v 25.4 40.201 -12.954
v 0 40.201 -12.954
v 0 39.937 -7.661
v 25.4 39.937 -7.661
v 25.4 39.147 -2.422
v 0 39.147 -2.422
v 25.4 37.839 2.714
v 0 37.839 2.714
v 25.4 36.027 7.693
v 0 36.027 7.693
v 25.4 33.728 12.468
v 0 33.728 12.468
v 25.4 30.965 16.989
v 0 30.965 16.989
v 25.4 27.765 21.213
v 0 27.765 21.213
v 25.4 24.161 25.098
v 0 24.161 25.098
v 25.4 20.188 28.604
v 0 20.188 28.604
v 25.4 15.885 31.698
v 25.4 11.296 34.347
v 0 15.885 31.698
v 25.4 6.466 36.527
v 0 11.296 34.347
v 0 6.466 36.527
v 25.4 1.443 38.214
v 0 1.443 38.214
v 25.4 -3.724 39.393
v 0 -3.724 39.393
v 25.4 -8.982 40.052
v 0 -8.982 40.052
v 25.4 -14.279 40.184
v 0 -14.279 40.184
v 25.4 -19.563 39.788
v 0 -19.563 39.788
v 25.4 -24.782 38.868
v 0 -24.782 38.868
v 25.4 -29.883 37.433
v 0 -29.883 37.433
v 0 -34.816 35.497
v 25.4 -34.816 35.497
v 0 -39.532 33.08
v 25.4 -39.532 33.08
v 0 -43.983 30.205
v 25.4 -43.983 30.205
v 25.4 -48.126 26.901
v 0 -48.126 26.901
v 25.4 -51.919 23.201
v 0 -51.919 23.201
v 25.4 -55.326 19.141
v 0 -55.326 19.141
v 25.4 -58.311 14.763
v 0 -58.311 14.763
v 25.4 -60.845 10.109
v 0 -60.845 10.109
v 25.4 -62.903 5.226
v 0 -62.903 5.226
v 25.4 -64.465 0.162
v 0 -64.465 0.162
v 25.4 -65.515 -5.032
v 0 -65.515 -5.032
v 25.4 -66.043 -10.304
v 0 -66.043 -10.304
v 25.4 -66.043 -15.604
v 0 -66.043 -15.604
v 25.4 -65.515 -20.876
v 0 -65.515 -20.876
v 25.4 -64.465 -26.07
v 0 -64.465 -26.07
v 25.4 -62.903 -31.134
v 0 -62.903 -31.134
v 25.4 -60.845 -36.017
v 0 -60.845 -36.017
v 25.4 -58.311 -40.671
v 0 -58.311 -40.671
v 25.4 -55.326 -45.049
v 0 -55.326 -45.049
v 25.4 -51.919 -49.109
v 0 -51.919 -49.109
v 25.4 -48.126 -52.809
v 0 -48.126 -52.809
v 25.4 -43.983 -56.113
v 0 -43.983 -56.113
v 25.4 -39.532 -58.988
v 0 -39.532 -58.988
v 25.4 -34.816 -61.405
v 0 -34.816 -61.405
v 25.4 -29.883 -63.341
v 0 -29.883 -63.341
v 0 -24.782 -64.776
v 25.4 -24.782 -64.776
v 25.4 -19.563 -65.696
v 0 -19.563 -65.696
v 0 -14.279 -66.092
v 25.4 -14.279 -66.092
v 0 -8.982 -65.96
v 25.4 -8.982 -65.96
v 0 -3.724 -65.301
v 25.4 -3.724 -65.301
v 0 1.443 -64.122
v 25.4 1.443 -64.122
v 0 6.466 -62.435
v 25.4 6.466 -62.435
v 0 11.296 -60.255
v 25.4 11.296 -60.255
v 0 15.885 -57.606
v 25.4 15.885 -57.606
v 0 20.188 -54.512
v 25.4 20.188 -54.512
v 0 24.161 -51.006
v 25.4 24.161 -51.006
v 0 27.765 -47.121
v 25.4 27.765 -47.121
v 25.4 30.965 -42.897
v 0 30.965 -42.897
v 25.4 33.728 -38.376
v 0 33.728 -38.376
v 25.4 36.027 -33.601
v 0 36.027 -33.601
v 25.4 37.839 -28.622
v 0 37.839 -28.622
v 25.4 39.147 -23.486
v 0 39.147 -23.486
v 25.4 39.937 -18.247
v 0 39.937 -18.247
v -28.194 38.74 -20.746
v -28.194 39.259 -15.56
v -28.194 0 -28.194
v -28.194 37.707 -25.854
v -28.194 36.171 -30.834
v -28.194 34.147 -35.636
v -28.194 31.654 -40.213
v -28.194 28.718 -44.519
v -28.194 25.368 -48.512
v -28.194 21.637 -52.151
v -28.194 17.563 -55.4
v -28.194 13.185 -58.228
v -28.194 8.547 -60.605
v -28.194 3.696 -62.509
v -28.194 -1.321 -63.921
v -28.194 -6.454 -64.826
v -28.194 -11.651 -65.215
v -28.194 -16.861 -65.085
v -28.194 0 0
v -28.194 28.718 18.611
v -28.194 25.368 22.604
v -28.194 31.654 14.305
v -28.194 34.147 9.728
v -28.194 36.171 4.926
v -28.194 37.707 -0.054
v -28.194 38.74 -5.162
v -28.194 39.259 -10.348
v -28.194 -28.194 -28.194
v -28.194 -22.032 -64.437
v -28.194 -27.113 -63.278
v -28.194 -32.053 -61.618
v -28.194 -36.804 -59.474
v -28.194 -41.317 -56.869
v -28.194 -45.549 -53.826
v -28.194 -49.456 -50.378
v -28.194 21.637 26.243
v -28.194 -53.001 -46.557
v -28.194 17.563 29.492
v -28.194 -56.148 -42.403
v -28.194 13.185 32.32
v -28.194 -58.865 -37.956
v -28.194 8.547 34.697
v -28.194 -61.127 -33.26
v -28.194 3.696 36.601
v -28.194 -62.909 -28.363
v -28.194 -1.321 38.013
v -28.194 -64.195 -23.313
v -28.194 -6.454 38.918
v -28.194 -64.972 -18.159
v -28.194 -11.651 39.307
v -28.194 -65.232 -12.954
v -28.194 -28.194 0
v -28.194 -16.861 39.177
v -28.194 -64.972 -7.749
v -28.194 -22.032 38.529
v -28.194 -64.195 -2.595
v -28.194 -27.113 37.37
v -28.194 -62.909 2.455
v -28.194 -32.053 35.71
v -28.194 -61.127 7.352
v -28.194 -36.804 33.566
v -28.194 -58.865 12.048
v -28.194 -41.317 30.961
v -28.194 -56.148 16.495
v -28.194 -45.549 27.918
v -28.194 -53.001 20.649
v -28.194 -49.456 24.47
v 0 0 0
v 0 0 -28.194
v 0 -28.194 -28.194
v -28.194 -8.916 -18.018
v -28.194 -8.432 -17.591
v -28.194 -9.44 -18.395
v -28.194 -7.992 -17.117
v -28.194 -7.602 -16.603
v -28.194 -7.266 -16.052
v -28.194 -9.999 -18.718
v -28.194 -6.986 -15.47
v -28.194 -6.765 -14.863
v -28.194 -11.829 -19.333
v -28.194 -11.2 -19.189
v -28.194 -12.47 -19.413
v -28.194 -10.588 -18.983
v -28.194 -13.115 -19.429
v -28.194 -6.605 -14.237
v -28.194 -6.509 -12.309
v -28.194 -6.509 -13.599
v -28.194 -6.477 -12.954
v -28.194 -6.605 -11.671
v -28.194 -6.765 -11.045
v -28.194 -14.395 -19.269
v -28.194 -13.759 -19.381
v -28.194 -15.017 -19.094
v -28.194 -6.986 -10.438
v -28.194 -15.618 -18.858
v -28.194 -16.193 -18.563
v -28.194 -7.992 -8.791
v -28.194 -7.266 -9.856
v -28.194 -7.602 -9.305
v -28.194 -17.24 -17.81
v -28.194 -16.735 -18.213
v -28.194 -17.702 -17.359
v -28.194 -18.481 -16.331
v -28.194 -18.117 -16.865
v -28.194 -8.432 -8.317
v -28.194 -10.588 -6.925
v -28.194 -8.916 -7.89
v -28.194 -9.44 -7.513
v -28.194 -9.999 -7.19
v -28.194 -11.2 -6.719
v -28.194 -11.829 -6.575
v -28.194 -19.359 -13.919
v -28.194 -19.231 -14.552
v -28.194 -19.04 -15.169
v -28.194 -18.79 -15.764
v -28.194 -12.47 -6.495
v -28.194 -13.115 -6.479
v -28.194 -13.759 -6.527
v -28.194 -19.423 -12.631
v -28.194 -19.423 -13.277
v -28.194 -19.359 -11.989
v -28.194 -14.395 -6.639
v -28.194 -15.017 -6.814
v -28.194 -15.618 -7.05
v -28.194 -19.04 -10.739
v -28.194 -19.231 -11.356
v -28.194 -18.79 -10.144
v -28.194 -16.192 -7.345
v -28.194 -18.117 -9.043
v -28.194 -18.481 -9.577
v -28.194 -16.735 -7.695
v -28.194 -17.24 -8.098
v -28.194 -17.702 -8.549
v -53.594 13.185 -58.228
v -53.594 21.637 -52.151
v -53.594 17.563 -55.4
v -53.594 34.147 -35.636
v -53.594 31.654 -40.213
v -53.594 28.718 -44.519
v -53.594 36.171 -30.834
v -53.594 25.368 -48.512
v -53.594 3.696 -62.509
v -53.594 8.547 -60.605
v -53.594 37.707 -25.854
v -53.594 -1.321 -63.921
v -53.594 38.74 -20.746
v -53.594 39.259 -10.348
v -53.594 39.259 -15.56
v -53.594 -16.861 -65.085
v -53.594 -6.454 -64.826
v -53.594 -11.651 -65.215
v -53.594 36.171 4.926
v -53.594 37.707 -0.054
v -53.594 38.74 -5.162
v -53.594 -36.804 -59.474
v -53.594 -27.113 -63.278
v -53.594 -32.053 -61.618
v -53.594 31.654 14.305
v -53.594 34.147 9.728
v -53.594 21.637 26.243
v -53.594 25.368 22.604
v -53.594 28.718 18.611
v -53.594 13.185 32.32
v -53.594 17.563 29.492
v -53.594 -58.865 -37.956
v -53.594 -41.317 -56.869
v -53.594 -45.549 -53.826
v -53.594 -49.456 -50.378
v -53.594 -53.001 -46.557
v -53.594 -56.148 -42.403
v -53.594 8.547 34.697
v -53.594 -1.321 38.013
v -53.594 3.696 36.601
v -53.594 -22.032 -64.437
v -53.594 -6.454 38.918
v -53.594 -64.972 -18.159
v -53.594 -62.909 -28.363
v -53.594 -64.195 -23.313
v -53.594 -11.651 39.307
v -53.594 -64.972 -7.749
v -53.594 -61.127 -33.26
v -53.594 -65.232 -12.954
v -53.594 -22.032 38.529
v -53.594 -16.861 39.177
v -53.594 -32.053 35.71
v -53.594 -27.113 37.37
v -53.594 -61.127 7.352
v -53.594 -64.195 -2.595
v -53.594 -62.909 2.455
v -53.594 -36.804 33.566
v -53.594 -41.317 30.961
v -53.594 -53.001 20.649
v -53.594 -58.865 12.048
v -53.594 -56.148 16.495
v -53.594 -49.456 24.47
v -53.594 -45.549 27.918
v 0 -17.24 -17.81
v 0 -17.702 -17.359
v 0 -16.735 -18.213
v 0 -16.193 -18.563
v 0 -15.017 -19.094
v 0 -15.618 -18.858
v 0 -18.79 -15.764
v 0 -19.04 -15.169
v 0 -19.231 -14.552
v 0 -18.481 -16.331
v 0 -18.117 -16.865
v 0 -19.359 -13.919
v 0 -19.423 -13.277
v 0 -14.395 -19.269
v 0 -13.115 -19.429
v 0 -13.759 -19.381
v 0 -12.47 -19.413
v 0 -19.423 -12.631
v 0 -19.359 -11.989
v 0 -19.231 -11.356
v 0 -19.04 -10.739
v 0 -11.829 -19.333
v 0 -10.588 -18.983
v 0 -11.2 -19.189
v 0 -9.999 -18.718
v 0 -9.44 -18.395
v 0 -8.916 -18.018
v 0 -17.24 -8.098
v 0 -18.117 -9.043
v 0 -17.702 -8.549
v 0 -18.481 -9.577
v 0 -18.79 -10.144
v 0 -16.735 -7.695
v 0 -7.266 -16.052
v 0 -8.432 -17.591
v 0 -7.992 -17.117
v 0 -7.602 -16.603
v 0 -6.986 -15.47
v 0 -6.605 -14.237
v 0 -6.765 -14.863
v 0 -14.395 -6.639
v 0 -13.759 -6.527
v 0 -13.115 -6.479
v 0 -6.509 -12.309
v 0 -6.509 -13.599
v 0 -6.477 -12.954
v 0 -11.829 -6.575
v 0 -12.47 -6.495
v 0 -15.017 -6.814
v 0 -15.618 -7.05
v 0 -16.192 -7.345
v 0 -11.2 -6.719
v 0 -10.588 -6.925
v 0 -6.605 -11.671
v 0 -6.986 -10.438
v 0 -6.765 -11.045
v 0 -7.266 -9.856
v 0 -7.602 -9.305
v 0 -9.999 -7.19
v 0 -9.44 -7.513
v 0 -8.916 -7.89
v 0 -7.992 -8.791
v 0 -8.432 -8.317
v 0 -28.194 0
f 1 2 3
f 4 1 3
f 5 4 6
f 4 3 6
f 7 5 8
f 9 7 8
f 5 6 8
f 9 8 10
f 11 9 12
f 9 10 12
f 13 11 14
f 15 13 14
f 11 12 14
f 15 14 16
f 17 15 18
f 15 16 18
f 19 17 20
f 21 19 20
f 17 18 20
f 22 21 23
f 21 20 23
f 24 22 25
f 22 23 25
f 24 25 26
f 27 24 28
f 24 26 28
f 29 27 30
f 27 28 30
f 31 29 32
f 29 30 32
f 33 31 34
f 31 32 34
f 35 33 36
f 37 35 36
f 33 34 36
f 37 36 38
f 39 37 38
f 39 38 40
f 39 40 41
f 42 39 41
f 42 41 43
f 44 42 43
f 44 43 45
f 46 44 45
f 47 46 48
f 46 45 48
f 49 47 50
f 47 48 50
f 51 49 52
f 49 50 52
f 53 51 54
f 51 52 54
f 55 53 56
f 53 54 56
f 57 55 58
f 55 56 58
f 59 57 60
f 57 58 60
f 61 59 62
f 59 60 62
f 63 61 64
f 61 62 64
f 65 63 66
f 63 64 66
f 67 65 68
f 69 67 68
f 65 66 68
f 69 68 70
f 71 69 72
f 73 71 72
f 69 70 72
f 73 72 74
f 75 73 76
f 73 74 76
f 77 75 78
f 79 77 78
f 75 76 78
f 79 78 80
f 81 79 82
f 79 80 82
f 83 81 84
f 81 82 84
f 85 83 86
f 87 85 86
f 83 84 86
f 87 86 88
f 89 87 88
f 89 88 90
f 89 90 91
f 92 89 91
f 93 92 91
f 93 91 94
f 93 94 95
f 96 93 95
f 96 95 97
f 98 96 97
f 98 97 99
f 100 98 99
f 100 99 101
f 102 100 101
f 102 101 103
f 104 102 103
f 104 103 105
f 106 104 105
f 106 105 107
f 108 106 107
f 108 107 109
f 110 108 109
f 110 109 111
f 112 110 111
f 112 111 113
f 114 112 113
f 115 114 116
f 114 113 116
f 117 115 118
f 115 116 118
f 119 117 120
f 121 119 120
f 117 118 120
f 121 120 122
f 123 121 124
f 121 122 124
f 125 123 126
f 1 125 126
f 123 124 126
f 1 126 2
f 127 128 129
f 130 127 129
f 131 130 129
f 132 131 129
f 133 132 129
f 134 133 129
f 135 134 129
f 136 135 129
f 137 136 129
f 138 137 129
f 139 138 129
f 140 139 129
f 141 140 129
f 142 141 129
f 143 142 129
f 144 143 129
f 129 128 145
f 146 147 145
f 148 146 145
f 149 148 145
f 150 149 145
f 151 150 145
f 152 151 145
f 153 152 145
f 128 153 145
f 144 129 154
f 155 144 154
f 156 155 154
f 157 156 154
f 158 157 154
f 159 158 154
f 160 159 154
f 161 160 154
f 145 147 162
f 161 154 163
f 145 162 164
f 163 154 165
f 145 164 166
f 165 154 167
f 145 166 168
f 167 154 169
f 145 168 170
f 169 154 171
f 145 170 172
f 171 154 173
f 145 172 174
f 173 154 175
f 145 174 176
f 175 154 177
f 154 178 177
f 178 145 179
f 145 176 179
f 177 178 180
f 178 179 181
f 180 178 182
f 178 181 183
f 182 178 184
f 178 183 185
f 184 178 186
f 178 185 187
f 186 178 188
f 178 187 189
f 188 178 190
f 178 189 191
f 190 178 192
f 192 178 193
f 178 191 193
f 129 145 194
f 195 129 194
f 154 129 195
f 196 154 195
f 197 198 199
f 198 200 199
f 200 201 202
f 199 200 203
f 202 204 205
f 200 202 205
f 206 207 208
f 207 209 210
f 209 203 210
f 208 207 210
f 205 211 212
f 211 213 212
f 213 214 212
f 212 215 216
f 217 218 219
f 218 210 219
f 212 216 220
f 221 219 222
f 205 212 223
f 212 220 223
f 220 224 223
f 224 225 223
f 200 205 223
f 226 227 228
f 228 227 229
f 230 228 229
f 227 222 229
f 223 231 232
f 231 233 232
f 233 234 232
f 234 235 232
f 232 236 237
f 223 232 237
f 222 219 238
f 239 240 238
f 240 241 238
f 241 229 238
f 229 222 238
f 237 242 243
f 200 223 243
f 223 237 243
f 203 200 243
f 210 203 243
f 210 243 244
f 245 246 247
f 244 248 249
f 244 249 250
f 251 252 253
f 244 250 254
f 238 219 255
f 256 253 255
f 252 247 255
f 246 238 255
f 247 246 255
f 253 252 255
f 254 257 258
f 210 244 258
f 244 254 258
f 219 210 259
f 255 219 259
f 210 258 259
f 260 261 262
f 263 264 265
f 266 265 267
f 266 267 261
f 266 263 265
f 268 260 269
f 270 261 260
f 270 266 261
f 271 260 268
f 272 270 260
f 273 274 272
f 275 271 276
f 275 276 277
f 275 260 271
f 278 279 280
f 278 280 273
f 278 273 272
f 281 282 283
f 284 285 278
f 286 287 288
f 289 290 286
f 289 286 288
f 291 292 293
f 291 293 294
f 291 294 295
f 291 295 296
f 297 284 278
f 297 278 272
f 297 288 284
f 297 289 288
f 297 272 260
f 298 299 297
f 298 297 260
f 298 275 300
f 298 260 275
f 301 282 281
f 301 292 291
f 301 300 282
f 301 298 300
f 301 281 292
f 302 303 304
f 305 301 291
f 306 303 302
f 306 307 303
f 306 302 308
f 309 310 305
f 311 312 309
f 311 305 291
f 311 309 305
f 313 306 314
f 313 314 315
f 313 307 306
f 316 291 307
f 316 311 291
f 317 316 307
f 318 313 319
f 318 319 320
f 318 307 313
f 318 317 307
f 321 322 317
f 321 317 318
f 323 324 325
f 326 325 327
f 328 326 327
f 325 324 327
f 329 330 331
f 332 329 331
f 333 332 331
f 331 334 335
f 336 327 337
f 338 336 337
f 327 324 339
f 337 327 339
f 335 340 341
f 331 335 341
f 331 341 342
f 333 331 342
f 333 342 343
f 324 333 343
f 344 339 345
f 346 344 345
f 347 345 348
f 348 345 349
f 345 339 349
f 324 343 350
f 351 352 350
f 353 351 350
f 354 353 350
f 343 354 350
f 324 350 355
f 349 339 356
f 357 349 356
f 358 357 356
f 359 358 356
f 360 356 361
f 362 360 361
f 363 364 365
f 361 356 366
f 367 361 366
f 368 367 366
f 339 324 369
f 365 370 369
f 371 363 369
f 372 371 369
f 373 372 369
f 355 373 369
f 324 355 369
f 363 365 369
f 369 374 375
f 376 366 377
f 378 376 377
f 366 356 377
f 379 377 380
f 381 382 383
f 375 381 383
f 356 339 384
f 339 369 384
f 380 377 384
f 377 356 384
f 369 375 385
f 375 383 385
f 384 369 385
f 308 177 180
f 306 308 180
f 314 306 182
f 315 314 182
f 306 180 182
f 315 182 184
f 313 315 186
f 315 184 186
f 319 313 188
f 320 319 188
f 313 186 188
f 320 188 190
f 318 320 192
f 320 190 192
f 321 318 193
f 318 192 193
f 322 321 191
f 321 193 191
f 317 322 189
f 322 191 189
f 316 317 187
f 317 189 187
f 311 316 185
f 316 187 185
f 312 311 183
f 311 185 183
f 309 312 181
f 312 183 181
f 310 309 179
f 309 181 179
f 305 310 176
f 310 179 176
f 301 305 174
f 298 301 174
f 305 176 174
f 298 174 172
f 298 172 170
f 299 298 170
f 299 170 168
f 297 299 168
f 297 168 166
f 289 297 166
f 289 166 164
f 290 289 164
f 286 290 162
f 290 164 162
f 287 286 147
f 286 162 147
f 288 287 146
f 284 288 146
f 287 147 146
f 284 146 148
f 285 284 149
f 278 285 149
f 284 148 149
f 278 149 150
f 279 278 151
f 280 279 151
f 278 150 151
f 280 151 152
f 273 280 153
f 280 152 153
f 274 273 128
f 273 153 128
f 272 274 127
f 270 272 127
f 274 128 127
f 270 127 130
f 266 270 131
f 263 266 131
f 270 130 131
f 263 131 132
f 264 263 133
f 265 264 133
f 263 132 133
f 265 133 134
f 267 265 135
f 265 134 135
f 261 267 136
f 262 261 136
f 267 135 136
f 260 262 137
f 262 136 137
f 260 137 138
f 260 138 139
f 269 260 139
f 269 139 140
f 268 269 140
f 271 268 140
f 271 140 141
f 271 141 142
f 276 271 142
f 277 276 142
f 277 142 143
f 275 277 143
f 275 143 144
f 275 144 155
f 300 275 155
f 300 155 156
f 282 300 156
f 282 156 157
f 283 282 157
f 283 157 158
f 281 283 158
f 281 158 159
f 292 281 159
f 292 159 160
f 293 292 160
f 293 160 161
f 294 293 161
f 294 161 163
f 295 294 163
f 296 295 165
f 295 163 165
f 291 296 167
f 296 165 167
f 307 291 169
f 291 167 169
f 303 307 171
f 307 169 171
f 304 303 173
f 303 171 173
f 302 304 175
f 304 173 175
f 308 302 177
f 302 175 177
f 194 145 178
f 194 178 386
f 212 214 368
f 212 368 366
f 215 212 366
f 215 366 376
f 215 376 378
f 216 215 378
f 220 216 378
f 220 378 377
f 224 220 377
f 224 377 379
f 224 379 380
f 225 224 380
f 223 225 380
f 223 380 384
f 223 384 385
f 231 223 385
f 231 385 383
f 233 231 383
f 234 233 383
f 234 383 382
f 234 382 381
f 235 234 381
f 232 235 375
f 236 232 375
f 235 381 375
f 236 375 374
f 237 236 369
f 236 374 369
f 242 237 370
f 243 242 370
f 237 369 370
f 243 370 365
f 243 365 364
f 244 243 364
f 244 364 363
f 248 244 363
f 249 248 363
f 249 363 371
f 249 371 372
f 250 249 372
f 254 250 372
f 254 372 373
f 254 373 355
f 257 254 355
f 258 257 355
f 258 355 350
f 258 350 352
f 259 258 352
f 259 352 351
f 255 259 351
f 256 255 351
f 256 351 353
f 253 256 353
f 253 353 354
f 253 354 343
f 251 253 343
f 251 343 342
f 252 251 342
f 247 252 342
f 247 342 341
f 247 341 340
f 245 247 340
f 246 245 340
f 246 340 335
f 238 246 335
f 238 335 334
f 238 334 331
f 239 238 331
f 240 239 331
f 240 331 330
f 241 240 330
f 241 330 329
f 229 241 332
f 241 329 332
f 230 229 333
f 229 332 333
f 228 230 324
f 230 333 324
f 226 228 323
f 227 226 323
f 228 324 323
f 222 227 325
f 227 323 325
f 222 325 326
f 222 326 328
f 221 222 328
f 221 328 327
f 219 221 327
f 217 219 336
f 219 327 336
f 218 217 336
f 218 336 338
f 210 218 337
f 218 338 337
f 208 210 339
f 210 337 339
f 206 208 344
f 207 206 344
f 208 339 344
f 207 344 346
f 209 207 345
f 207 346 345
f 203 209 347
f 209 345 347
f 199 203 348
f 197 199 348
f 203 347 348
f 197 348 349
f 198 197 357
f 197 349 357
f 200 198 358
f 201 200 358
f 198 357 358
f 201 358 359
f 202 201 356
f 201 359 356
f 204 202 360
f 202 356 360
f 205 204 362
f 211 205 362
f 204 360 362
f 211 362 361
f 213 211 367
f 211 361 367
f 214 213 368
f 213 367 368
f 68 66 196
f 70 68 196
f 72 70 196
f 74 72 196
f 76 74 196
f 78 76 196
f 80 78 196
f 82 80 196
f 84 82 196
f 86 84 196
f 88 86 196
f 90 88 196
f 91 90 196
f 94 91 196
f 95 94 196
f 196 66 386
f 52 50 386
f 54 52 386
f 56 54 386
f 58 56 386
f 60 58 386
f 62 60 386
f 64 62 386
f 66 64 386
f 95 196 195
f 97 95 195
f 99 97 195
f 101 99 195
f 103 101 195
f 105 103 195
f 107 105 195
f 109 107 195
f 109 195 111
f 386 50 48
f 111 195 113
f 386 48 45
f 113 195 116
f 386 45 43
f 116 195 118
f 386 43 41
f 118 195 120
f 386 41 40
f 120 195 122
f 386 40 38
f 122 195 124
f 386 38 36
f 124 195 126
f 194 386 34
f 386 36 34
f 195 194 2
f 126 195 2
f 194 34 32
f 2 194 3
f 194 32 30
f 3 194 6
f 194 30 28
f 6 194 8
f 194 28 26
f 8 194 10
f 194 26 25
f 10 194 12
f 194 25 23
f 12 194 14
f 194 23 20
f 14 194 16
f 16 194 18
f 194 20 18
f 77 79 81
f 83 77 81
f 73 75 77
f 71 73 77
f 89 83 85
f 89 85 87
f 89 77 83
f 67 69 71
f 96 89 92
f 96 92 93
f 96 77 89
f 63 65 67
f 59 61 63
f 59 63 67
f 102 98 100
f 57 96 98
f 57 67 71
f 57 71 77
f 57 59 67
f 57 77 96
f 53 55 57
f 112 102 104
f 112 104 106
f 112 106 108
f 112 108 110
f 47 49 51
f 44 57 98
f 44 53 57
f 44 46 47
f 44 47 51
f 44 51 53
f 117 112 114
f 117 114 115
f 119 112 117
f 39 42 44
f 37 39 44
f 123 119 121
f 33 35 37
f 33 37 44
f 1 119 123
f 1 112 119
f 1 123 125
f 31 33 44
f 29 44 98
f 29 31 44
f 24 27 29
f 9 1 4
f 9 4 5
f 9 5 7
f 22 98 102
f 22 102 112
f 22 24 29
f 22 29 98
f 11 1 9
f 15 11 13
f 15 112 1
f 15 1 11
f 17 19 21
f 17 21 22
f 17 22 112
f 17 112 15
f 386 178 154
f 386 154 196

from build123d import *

# Parameters (mm, degrees)
F0_W     = 28.194
F0_H     = 28.194
F1_DEPTH = 28.194
F2_R     = 6.477
F3_DEPTH = 28.195
F4_R     = 53.155015
F5_DEPTH = 25.4
F6_R     = 52.277652
F7_DEPTH = 25.4


with BuildPart() as f1:
    # F0 (on Front) → F1 (new body)
    with BuildSketch(Plane.XZ):
        with Locations((-14.097, -14.097)):
            Rectangle(F0_W, F0_H)
    extrude(amount=F1_DEPTH)

    # F2 (on face) → F3 (cut, through all)
    with BuildSketch(Plane.YZ):
        with Locations((-12.954, -12.954)):
            Circle(F2_R)
    extrude(amount=-F3_DEPTH, mode=Mode.SUBTRACT)

    # F4 (on face) → F5 (join)
    with BuildSketch(Plane.YZ):
        with Locations((-12.954, -12.954)):
            Circle(F4_R)
    extrude(amount=F5_DEPTH)

    # F6 (on face) → F7 (join)
    with BuildSketch(Plane(origin=(-28.194, 0, 0), x_dir=(0, -1, 0), z_dir=(-1, 0, 0))):
        with Locations((12.954, -12.954)):
            Circle(F6_R)
    extrude(amount=F7_DEPTH)


solid = f1.part
